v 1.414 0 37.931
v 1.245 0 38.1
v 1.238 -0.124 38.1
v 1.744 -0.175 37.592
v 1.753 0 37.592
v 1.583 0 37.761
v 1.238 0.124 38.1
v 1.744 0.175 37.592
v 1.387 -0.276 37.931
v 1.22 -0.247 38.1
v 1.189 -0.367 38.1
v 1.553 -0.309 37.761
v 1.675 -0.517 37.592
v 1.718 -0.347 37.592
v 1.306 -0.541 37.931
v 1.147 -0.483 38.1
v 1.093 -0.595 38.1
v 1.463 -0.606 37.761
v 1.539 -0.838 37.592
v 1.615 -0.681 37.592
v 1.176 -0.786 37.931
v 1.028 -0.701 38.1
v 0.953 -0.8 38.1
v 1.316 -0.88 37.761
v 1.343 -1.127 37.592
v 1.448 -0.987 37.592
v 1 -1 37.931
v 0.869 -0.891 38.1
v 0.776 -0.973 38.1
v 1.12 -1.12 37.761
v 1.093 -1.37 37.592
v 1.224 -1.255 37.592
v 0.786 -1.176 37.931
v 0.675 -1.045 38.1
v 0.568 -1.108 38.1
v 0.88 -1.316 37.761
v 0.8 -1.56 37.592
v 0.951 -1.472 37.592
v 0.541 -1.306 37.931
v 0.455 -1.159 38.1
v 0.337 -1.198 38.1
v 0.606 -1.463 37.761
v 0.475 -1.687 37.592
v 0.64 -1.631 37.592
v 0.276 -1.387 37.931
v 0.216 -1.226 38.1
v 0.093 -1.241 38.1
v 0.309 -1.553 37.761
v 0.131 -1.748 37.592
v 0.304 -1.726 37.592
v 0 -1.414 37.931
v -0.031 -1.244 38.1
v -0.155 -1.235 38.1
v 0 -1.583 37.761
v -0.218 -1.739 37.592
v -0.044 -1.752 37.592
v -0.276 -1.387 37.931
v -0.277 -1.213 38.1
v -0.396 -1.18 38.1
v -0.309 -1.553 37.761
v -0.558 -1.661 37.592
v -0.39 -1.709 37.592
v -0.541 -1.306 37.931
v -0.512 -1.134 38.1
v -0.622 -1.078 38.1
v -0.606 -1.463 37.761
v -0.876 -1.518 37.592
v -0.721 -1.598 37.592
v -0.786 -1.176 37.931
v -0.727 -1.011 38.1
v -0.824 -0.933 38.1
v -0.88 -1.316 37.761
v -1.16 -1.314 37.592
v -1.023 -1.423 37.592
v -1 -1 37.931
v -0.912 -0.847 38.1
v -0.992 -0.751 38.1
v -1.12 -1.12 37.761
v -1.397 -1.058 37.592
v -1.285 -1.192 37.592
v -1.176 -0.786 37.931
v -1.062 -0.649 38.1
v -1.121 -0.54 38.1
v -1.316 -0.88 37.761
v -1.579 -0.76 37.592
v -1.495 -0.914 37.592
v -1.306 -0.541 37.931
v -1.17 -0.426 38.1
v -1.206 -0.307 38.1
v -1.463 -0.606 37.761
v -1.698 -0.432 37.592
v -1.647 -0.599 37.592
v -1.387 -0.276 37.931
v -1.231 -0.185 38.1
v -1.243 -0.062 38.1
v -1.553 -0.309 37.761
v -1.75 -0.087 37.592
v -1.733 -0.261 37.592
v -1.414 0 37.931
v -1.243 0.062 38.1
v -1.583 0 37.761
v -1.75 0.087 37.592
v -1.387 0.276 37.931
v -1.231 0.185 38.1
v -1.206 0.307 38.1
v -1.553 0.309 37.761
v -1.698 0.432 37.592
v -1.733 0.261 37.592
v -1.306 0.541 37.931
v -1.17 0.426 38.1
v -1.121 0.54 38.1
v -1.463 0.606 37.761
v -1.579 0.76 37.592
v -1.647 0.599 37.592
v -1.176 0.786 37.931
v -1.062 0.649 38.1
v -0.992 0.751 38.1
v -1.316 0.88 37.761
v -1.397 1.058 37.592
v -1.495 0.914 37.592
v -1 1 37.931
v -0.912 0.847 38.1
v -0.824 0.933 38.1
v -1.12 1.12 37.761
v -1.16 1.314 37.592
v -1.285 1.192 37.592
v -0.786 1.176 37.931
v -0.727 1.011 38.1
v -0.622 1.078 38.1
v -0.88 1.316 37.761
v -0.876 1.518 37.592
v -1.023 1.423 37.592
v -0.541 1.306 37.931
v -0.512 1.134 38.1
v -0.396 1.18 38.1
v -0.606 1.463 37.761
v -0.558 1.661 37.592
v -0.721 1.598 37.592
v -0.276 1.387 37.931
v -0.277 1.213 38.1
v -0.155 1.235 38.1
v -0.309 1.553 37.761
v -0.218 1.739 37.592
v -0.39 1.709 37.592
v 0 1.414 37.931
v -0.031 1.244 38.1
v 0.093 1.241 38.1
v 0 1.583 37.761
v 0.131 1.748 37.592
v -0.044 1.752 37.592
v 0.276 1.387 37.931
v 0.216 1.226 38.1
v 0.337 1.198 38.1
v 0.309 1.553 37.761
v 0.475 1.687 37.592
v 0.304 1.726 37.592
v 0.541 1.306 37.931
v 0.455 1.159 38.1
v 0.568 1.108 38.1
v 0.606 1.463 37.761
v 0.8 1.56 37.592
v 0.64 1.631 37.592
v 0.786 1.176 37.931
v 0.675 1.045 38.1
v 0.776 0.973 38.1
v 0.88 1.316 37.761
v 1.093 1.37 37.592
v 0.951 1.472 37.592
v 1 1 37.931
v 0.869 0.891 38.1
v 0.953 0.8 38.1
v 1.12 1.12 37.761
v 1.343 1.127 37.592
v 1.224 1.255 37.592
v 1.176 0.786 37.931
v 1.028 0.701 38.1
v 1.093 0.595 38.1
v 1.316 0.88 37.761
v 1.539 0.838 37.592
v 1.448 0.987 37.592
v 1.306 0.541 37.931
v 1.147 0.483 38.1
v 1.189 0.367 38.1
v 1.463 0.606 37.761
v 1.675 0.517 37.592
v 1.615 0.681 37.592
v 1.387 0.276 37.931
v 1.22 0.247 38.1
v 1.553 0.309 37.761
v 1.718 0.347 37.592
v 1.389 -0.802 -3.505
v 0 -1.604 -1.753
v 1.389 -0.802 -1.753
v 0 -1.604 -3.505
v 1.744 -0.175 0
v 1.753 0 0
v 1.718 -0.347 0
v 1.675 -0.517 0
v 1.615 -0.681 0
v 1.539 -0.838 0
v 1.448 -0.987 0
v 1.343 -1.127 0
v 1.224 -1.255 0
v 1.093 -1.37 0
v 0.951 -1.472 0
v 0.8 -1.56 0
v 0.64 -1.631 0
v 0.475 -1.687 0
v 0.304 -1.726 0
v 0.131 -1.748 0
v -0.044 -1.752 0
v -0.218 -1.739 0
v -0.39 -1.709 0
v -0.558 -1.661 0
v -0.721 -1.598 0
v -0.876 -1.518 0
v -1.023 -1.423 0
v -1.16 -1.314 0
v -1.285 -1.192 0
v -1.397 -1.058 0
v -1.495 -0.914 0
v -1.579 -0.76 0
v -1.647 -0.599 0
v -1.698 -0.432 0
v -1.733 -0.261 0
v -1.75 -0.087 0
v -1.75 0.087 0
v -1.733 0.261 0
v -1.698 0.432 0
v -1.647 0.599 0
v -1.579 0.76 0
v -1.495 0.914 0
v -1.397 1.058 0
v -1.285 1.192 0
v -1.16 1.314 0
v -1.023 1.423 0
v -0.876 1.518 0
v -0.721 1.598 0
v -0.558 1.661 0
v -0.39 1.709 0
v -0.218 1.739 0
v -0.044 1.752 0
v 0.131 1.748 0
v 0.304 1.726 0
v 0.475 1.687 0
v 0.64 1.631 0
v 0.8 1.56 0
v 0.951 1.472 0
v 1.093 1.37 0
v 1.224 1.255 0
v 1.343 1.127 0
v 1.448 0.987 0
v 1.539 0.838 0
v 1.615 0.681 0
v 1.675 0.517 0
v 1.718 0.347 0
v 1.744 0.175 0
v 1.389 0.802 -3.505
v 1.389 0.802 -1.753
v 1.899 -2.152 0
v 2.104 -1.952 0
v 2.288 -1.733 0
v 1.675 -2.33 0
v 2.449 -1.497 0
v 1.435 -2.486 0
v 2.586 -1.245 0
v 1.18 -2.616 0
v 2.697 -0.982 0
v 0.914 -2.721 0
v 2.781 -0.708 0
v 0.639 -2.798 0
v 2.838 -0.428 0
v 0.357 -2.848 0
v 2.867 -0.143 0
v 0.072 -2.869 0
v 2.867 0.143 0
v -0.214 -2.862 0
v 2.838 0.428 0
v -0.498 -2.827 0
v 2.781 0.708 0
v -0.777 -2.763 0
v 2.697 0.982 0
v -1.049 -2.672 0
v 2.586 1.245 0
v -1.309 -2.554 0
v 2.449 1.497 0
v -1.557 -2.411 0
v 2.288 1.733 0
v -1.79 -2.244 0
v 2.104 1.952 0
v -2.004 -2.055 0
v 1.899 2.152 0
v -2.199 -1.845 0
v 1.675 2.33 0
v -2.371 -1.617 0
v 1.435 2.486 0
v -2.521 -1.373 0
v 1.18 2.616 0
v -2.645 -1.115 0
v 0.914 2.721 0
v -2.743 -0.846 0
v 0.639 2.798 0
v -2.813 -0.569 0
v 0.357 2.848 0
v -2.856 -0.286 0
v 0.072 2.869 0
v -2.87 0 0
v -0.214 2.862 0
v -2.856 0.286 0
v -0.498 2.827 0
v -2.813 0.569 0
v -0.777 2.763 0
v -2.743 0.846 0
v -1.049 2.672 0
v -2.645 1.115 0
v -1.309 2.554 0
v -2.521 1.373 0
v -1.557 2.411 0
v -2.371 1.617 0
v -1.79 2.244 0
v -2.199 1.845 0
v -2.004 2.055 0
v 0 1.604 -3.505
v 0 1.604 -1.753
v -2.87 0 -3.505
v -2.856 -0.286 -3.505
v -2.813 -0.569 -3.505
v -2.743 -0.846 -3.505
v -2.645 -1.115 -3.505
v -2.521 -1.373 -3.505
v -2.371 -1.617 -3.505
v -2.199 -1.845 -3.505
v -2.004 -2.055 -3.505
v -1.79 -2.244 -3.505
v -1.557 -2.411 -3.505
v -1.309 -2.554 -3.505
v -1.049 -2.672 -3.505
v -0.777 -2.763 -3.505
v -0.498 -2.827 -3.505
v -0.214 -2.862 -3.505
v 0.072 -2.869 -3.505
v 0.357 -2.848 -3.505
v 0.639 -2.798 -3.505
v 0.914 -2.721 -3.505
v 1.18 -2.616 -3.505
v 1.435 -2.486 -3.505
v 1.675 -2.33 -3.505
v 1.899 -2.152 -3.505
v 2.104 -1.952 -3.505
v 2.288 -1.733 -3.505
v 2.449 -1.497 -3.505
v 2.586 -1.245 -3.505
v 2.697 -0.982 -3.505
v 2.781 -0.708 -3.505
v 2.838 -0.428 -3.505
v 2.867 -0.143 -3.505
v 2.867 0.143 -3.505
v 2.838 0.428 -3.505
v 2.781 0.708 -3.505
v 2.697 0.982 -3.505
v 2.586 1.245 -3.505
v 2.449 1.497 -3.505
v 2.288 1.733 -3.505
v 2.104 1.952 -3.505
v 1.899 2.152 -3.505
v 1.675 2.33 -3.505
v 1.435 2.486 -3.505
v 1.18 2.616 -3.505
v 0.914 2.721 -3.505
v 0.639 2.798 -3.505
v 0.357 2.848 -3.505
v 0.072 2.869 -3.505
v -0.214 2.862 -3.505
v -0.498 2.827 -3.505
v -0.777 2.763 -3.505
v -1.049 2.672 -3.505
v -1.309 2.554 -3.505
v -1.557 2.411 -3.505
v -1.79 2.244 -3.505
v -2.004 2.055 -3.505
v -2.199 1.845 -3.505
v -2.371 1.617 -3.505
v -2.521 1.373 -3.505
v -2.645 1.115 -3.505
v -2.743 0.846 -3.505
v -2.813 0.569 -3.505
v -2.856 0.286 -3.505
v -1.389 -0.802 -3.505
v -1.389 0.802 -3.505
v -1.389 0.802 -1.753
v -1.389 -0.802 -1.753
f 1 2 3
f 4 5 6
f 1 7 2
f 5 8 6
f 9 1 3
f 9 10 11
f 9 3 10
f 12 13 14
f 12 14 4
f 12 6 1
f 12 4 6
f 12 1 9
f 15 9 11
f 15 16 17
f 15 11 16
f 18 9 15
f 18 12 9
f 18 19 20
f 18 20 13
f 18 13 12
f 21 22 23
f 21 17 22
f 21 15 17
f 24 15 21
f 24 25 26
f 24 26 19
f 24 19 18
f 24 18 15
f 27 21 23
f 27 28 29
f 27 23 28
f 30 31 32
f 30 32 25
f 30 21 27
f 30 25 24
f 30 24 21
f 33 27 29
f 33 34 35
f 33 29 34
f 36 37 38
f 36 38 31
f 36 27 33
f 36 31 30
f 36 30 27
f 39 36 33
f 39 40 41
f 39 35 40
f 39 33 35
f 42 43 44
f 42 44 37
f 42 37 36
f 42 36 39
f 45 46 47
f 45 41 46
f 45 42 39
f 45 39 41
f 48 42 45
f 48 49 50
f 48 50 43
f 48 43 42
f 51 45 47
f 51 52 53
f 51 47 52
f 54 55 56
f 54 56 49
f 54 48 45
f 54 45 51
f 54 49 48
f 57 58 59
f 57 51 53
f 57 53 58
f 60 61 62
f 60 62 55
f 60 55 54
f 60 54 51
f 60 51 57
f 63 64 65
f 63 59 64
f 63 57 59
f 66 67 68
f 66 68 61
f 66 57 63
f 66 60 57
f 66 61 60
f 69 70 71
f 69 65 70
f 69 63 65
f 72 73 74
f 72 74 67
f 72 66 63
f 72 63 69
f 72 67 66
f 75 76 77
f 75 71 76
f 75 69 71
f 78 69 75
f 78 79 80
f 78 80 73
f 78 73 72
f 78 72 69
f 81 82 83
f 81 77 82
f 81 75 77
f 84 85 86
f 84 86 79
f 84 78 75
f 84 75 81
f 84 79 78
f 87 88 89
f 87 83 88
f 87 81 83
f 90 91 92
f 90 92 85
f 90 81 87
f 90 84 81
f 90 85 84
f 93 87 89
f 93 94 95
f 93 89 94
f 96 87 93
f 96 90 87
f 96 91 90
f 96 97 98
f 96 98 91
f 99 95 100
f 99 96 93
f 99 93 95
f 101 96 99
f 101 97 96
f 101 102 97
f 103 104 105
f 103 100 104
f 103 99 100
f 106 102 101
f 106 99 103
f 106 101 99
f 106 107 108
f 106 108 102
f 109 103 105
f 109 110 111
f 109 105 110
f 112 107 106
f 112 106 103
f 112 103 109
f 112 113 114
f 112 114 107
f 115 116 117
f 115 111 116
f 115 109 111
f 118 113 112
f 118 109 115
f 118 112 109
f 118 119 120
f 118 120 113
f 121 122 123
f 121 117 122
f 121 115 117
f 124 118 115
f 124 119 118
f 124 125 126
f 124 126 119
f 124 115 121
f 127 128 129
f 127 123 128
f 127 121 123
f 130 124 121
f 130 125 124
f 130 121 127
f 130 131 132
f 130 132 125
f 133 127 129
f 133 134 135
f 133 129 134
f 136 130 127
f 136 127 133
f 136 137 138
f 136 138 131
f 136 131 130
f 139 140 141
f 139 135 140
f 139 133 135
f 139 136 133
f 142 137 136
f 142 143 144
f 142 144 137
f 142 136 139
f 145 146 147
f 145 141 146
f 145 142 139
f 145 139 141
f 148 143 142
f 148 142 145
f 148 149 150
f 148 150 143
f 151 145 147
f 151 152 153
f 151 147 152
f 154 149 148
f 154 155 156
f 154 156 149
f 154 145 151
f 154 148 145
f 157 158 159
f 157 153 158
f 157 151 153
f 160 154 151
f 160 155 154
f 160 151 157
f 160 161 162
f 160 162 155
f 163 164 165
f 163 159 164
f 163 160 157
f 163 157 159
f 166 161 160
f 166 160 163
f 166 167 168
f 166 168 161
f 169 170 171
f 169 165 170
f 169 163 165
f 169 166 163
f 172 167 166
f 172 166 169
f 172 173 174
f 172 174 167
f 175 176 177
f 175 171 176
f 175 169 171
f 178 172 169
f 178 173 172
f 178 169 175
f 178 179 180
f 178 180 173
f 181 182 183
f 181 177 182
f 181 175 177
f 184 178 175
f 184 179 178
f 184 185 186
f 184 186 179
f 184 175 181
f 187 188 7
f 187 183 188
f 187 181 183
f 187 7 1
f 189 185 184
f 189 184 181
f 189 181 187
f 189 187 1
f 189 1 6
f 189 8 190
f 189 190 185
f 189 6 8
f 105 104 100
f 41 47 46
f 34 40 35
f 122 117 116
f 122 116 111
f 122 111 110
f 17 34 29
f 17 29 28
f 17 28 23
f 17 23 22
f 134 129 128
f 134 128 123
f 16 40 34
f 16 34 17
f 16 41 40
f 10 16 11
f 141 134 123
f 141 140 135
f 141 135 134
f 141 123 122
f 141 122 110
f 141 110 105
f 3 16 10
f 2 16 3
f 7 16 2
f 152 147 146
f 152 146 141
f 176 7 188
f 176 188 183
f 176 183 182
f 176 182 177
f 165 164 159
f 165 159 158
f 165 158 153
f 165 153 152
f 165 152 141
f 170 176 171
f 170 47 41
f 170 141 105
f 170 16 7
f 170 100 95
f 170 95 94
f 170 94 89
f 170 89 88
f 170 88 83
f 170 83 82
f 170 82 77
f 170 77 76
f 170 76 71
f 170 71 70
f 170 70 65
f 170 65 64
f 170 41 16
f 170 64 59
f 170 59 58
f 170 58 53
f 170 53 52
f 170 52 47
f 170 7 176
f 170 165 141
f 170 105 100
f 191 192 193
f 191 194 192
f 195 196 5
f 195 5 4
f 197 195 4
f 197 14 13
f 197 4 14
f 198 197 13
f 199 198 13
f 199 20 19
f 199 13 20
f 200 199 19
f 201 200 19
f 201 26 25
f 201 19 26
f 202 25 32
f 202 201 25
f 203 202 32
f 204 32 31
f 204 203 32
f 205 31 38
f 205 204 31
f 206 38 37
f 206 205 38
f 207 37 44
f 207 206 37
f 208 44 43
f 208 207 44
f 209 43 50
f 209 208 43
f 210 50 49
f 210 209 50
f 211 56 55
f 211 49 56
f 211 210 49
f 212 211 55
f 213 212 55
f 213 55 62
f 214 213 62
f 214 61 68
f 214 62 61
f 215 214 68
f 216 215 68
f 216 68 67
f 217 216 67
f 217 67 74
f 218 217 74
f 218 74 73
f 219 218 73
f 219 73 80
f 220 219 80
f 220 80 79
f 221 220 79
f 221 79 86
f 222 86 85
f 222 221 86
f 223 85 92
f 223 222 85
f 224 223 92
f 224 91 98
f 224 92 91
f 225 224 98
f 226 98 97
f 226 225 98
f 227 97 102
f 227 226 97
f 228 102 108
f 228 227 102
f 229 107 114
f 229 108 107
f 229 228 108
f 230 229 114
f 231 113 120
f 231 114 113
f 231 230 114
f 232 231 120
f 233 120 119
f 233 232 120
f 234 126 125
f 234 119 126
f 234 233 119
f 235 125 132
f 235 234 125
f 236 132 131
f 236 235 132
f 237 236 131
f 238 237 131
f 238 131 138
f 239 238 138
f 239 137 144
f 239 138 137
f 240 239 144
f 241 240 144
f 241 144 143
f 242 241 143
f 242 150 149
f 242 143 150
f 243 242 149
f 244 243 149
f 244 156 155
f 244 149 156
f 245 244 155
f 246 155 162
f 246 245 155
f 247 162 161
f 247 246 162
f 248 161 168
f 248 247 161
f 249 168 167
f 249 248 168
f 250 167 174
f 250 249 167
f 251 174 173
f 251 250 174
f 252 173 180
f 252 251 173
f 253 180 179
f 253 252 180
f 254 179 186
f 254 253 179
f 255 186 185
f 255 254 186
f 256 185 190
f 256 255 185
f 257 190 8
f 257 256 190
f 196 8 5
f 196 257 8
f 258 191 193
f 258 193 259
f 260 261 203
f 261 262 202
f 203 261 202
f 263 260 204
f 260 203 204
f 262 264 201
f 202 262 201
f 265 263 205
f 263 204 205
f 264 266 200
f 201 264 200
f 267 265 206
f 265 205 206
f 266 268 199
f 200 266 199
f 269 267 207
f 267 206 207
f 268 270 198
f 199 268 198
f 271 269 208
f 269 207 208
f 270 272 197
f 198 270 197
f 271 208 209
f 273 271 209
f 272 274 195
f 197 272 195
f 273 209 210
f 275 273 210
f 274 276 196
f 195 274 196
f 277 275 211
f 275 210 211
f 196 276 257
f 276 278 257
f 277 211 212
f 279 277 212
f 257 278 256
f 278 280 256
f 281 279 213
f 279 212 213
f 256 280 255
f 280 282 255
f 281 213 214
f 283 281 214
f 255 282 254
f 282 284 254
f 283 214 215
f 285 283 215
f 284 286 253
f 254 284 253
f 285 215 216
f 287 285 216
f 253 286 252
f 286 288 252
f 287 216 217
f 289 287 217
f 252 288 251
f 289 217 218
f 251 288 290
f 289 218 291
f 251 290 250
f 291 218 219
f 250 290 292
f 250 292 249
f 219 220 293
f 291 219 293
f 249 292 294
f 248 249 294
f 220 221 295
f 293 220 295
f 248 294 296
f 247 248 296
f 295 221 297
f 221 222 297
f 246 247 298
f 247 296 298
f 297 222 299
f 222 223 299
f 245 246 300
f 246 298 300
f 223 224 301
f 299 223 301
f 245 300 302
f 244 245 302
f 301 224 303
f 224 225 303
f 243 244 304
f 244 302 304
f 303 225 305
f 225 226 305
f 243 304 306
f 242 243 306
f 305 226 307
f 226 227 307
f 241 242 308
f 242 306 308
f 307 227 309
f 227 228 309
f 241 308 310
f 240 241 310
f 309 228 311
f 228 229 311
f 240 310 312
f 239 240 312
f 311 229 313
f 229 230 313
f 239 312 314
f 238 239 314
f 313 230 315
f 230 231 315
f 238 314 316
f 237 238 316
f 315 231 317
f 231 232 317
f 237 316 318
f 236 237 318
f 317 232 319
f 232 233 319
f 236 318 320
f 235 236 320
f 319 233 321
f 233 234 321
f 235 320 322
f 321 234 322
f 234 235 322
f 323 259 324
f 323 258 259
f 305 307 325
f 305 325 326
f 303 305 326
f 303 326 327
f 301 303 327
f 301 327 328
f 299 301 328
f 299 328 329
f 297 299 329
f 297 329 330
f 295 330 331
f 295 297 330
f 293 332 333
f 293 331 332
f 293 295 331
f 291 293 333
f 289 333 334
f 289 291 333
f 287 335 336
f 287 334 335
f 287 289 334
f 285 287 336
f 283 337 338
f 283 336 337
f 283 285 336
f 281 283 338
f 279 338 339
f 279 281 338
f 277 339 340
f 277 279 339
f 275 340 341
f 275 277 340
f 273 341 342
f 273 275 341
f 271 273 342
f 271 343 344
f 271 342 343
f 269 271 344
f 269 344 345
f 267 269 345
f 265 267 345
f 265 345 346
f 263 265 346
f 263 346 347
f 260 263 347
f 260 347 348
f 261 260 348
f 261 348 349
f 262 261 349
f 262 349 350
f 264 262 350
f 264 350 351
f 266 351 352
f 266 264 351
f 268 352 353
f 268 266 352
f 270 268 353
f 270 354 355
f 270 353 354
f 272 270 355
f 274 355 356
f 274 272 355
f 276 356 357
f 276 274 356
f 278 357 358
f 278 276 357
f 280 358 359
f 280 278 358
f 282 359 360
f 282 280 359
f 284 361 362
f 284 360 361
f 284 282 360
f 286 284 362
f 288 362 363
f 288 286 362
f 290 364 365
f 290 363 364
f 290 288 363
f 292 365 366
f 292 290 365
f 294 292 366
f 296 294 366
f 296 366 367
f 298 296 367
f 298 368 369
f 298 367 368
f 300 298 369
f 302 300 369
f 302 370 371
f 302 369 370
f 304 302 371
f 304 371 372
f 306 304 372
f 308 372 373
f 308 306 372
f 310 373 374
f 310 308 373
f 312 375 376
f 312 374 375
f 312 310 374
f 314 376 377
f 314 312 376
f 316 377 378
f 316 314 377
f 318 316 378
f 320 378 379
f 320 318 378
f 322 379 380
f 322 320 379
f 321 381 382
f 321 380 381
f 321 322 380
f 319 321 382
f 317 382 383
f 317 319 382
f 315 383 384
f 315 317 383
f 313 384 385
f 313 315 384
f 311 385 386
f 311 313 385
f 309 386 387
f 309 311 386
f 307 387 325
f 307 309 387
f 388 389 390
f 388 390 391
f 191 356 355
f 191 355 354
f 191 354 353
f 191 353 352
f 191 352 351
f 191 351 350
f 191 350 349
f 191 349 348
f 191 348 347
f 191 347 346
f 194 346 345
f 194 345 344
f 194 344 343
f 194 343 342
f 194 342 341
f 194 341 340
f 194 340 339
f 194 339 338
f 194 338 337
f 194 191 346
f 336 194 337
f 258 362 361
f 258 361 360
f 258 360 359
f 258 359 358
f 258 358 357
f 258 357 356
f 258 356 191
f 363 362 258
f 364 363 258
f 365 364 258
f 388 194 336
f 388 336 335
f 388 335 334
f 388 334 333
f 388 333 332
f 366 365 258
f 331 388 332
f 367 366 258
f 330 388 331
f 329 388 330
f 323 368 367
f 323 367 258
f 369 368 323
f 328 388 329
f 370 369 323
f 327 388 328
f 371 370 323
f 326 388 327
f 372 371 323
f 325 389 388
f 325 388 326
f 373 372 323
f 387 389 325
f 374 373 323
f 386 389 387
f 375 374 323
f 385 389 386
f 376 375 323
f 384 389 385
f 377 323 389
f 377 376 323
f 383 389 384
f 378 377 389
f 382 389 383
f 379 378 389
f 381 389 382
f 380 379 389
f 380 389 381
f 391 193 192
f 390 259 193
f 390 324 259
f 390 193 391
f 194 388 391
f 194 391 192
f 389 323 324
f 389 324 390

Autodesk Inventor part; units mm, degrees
ref_plane "YZ Plane" through (0, 0, 0) normal (1, 0, 0) x (0, 1, 0)
ref_plane "XZ Plane" through (0, 0, 0) normal (0, 1, 0) x (-1, 0, 0)
ref_plane "XY Plane" through (0, 0, 0) normal (0, 0, 1) x (1, 0, 0)
sketch "Sketch1" plane through (0, 0, 0) normal (0, 0, 1) x (1, 0, 0)
  circle A0 centre (0, 0) radius 1.7526
  dimension "d0" = 3.5052
extrude "Extrusion1" add sketch "Sketch1" along normal blind 38.1
sketch "Sketch2" plane through (0, 0, 0) normal (0, 0, -1) x (-1, 0, 0)
  circle A0 centre (0, 0) radius 1.7526 construction
  circle A1 centre (0, 0) radius 2.8702
  dimension "d3" = 5.7404
extrude "Extrusion2" add sketch "Sketch2" along normal blind 3.5052
sketch "Sketch3" plane through (0, 0, -3.5052) normal (0, 0, -1) x (-1, 0, 0)
  circle A0 centre (0, 0) radius 2.8702 projected
  line L0 (0, 1.604) -> (1.3891, 0.802)
  line L1 (1.3891, 0.802) -> (1.3891, -0.802)
  line L2 (1.3891, -0.802) -> (0, -1.604)
  line L3 (0, -1.604) -> (-1.3891, -0.802)
  line L4 (-1.3891, -0.802) -> (-1.3891, 0.802)
  line L5 (-1.3891, 0.802) -> (0, 1.604)
  dimension "d6" = 2.7781
extrude "Extrusion3" cut sketch "Sketch3" against normal blind 1.7526 contours L0 L1 L2 L3 L4 L5
chamfer "Chamfer1" distance 0.508 angle 45 1 edges at (-1.7526, 0, 38.1)
thread "Thread2" size "6-32 UNC" class "2A" standard "ANSI Unified Screw Threads" length 25.4
properties part number "6-32 SHCS x1500" material "Stainless Steel"
